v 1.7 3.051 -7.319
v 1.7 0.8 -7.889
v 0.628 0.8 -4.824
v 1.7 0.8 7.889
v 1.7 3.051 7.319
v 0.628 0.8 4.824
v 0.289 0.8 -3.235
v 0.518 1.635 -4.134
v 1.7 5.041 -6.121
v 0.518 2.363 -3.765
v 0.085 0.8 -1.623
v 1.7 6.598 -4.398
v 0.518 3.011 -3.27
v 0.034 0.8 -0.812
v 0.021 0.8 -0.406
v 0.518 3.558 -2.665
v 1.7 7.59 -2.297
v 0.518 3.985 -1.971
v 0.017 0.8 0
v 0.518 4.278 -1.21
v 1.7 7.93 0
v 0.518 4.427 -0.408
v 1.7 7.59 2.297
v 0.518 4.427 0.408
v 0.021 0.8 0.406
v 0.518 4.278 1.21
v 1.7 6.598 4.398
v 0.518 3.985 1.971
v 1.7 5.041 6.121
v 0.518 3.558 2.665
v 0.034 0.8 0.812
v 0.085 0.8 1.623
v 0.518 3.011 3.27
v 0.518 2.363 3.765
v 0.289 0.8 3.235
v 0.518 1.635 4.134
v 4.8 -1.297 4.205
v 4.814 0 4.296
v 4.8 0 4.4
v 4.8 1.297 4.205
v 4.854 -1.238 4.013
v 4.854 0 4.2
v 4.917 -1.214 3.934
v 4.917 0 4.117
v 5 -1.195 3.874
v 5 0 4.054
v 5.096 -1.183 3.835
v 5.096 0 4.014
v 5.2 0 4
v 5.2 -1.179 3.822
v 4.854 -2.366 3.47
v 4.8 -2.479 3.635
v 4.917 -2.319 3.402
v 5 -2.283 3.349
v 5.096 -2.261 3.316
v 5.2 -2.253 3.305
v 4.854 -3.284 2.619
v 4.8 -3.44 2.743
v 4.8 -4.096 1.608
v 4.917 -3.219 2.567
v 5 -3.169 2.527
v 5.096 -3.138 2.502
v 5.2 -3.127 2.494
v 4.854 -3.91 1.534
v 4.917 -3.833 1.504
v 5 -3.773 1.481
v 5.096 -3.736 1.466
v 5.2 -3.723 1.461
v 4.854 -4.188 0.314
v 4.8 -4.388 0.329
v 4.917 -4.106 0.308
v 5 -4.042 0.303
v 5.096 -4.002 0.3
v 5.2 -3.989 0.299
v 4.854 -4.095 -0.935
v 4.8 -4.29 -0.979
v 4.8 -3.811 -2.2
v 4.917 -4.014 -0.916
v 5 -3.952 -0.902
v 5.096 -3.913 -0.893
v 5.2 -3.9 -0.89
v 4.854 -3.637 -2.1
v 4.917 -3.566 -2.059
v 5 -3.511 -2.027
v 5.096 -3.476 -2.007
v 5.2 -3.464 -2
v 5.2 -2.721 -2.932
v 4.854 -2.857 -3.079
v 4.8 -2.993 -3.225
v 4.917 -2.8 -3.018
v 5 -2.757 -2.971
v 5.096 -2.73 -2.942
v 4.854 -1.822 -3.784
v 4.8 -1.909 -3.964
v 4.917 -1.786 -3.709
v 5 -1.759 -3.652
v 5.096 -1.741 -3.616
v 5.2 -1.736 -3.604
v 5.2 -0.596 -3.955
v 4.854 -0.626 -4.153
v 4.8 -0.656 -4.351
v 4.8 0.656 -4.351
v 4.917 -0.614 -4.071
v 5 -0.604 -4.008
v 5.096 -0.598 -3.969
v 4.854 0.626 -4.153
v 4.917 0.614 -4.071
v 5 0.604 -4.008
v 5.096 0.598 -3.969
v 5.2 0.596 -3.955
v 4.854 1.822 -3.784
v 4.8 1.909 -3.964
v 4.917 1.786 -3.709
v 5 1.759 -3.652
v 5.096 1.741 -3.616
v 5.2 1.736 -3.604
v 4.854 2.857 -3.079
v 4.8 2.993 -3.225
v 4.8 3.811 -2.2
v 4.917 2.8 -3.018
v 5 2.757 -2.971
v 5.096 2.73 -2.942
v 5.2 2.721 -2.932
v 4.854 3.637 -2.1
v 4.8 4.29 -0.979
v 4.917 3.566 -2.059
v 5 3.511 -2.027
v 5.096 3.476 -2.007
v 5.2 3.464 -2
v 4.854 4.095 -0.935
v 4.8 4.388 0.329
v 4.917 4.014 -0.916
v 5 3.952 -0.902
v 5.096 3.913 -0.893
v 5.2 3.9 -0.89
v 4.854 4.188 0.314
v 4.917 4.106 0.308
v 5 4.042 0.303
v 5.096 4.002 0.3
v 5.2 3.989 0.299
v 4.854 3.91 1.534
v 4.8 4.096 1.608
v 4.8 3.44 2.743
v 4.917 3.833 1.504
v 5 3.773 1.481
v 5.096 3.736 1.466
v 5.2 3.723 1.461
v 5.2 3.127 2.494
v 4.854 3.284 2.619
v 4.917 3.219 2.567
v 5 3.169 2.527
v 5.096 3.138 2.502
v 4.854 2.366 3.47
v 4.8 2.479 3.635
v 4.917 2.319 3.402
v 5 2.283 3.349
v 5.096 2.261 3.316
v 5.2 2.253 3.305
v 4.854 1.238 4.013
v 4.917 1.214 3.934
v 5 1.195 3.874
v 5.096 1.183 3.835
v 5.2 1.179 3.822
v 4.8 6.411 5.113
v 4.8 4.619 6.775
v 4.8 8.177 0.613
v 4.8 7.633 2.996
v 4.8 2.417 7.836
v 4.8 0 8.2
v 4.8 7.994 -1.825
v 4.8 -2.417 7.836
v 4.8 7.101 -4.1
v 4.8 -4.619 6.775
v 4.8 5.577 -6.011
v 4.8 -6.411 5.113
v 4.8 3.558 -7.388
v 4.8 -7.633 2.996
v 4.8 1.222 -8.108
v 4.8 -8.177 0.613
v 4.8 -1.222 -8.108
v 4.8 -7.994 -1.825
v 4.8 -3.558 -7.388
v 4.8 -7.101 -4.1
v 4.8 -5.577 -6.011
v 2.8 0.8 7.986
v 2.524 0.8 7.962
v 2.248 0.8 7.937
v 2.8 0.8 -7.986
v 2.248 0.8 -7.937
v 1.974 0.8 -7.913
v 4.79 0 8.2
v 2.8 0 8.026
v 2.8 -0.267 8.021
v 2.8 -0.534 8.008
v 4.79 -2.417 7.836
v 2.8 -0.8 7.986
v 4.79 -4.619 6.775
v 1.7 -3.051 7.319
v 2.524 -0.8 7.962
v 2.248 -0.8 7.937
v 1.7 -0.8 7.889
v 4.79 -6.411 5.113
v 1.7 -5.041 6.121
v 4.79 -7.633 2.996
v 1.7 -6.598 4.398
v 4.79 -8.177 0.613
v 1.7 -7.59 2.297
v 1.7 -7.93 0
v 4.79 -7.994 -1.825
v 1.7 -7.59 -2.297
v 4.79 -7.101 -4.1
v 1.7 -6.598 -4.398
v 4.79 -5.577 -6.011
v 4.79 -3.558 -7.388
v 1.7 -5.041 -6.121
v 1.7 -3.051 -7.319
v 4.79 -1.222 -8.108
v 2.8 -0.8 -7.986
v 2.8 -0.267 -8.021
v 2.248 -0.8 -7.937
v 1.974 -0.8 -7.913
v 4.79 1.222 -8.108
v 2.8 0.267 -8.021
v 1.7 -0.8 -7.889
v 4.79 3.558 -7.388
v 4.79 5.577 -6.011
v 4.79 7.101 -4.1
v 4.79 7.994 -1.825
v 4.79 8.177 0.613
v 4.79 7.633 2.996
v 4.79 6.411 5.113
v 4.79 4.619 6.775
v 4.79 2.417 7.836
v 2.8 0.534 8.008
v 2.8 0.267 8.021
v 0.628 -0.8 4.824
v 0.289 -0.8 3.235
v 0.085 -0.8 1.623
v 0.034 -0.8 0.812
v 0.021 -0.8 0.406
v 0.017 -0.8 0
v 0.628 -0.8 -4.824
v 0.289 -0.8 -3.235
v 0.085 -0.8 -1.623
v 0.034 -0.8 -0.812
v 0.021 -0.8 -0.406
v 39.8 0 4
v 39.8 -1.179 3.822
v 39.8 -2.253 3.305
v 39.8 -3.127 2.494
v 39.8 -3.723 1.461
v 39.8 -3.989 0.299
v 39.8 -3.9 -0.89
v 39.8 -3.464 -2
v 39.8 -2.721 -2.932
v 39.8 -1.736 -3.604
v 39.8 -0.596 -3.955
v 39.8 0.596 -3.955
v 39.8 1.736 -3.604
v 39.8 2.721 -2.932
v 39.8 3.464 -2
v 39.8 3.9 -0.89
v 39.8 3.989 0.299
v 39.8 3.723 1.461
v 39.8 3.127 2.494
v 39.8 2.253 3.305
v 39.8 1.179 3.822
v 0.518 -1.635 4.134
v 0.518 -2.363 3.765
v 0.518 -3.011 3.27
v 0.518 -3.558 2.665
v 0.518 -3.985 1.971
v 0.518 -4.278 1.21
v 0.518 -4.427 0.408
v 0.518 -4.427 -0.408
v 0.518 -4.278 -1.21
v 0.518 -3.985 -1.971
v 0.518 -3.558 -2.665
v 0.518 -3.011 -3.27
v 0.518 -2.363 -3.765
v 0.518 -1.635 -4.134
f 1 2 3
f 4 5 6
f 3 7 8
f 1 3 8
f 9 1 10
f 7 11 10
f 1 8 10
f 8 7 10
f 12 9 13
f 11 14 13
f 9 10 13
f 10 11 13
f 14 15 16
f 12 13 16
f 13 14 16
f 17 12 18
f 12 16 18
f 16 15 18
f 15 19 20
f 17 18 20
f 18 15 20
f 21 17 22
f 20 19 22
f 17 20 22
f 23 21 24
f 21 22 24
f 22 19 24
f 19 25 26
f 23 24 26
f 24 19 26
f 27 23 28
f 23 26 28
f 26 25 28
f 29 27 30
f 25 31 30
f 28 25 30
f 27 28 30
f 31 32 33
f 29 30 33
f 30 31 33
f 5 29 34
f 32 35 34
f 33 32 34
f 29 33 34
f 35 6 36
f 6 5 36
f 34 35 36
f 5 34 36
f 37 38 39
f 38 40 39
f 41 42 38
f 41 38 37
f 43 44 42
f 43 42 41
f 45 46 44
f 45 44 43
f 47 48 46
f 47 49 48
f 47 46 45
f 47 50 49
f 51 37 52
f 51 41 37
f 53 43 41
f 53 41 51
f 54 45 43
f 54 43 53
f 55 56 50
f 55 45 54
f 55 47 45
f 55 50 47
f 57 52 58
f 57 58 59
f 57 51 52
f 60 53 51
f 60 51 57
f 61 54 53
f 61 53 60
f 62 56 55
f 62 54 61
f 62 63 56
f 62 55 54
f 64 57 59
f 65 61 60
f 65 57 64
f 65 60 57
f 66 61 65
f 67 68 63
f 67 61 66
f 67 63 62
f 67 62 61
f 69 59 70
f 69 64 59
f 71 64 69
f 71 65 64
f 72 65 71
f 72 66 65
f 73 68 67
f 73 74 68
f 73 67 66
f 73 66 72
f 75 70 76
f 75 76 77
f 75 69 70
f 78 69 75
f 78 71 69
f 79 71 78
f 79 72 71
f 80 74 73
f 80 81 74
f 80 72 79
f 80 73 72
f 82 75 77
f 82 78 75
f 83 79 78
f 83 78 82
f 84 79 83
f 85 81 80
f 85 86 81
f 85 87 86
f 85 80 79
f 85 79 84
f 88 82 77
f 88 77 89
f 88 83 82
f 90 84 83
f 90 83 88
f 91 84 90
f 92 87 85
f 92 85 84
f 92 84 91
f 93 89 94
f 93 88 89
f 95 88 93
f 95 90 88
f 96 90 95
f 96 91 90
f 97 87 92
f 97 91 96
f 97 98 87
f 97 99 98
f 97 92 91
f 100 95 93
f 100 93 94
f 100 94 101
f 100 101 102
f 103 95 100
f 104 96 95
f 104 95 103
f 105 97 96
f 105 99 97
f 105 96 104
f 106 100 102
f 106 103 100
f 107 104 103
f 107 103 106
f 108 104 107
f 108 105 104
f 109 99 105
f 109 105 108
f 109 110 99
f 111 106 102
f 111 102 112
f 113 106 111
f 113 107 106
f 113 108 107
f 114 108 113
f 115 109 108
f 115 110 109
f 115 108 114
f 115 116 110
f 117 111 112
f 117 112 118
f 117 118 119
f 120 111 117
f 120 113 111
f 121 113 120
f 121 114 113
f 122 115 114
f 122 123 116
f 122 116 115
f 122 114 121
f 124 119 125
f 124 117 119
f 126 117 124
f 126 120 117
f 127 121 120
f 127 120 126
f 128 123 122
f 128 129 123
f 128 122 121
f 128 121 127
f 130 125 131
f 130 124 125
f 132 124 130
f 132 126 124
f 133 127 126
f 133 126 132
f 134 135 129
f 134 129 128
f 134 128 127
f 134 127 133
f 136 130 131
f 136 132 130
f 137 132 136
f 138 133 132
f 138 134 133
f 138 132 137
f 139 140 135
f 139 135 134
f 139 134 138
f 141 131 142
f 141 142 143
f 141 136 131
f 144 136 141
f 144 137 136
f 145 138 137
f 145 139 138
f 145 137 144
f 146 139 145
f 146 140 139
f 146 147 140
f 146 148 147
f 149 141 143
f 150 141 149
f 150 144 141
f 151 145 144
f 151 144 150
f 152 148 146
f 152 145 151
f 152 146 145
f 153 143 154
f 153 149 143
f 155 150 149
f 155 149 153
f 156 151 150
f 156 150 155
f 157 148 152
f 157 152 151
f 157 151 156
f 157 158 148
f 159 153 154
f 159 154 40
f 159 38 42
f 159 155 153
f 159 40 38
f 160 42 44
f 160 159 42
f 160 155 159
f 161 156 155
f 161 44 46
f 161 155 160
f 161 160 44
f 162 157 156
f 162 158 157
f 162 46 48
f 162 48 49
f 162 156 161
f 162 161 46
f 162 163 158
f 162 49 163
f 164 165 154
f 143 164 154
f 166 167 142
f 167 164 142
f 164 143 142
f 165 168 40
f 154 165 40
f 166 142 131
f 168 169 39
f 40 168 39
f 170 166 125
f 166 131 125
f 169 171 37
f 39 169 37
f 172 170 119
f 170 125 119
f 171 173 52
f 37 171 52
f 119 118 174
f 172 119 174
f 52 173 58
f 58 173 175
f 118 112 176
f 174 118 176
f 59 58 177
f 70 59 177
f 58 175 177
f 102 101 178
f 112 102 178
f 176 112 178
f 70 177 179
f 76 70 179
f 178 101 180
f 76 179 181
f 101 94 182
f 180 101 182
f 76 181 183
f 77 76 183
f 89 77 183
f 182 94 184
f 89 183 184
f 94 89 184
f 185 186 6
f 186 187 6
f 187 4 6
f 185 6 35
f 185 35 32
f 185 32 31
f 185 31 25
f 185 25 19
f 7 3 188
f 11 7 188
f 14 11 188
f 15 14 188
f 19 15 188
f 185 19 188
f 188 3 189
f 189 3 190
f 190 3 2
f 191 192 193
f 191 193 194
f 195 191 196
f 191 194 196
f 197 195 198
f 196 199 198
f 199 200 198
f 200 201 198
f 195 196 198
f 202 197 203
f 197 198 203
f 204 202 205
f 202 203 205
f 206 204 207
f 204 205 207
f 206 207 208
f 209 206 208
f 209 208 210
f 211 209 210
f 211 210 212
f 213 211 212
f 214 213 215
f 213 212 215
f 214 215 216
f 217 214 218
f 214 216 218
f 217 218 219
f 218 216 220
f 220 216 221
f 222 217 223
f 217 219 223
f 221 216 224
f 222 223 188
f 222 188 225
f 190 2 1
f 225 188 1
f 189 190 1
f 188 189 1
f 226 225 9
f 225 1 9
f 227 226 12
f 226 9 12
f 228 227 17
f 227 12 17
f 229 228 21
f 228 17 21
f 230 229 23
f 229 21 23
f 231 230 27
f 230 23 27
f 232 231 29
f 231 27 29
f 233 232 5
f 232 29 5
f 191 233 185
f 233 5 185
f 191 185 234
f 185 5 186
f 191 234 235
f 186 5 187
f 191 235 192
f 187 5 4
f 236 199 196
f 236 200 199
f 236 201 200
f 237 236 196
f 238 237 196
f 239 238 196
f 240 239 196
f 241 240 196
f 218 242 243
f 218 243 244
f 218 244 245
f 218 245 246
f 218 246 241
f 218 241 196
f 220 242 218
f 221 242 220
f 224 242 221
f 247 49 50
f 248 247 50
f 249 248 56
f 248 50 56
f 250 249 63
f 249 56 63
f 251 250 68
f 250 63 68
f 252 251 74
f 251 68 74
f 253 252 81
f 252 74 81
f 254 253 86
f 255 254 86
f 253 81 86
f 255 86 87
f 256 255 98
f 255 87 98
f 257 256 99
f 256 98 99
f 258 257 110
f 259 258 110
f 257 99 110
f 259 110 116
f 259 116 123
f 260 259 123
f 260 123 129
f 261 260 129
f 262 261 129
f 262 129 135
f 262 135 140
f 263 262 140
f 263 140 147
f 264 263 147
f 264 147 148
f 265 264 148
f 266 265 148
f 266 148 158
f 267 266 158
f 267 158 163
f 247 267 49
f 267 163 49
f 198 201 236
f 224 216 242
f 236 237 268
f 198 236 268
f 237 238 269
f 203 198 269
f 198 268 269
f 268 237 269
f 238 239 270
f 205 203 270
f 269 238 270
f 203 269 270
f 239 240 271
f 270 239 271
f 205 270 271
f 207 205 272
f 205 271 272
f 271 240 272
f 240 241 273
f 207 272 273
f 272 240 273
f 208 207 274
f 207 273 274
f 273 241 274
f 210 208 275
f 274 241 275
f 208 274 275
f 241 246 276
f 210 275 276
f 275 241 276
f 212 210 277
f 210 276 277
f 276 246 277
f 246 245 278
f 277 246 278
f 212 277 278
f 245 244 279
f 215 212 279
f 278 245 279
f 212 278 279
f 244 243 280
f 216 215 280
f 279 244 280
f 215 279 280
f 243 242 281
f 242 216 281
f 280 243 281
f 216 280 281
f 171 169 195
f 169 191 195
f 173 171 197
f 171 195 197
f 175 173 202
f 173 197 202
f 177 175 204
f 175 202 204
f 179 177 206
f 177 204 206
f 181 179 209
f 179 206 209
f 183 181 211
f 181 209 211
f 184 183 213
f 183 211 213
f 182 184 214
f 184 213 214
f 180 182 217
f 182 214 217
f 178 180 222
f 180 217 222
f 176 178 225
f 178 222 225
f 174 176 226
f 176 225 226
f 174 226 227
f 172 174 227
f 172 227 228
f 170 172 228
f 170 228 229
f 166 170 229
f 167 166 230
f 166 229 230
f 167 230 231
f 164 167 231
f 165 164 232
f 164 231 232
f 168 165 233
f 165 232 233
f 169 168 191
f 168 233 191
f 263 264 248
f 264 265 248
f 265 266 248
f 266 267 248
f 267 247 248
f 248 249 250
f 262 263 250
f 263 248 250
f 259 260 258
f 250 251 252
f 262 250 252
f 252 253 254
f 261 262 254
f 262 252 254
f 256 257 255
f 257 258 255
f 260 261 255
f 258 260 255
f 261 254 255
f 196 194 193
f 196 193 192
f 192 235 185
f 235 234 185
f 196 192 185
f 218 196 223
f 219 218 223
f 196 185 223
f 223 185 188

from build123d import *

# Parameters (mm, degrees)
FILLET1_R  = 0.4
SKETCH2_W  = 16.4
SKETCH2_H  = 1.6
SLOT_DEPTH = 2.8


with BuildPart() as part:
    # BodySke → Base-Revolve (revolve)
    with BuildSketch(Plane.XY, mode=Mode.PRIVATE) as base_revolve_sk:
        with BuildLine():
            Line((4.8, 4), (4.8, 8.2))
            Line((4.8, 8.2), (4.79, 8.2))
            Line((4.79, 8.2), (1.7, 7.92966003))
            ThreePointArc((1.7, 7.92966003), (0.429774249, 4.054920104), (0, 0))
            Line((0, 0), (39.8, 0))
            Line((39.8, 0), (39.8, 4))
            Line((39.8, 4), (4.8, 4))
        make_face()
    revolve(base_revolve_sk.sketch.rotate(Axis((-25.4, 0, 0), (1, 0, 0)), 90), axis=Axis((-25.4, 0, 0), (1, 0, 0)))

    # Fillet1
    fillet1_edges = [part.edges().sort_by_distance(p)[0] for p in [
        (4.8, 0, -4),
    ]]
    fillet(fillet1_edges, radius=FILLET1_R)

    # Sketch2 → Slot (cut)
    with BuildSketch(Plane(origin=(0, 0, 0), x_dir=(0, 0, -1), z_dir=(1, 0, 0))):
        Rectangle(SKETCH2_W, SKETCH2_H)
    extrude(amount=SLOT_DEPTH, mode=Mode.SUBTRACT)


solid = part.part
